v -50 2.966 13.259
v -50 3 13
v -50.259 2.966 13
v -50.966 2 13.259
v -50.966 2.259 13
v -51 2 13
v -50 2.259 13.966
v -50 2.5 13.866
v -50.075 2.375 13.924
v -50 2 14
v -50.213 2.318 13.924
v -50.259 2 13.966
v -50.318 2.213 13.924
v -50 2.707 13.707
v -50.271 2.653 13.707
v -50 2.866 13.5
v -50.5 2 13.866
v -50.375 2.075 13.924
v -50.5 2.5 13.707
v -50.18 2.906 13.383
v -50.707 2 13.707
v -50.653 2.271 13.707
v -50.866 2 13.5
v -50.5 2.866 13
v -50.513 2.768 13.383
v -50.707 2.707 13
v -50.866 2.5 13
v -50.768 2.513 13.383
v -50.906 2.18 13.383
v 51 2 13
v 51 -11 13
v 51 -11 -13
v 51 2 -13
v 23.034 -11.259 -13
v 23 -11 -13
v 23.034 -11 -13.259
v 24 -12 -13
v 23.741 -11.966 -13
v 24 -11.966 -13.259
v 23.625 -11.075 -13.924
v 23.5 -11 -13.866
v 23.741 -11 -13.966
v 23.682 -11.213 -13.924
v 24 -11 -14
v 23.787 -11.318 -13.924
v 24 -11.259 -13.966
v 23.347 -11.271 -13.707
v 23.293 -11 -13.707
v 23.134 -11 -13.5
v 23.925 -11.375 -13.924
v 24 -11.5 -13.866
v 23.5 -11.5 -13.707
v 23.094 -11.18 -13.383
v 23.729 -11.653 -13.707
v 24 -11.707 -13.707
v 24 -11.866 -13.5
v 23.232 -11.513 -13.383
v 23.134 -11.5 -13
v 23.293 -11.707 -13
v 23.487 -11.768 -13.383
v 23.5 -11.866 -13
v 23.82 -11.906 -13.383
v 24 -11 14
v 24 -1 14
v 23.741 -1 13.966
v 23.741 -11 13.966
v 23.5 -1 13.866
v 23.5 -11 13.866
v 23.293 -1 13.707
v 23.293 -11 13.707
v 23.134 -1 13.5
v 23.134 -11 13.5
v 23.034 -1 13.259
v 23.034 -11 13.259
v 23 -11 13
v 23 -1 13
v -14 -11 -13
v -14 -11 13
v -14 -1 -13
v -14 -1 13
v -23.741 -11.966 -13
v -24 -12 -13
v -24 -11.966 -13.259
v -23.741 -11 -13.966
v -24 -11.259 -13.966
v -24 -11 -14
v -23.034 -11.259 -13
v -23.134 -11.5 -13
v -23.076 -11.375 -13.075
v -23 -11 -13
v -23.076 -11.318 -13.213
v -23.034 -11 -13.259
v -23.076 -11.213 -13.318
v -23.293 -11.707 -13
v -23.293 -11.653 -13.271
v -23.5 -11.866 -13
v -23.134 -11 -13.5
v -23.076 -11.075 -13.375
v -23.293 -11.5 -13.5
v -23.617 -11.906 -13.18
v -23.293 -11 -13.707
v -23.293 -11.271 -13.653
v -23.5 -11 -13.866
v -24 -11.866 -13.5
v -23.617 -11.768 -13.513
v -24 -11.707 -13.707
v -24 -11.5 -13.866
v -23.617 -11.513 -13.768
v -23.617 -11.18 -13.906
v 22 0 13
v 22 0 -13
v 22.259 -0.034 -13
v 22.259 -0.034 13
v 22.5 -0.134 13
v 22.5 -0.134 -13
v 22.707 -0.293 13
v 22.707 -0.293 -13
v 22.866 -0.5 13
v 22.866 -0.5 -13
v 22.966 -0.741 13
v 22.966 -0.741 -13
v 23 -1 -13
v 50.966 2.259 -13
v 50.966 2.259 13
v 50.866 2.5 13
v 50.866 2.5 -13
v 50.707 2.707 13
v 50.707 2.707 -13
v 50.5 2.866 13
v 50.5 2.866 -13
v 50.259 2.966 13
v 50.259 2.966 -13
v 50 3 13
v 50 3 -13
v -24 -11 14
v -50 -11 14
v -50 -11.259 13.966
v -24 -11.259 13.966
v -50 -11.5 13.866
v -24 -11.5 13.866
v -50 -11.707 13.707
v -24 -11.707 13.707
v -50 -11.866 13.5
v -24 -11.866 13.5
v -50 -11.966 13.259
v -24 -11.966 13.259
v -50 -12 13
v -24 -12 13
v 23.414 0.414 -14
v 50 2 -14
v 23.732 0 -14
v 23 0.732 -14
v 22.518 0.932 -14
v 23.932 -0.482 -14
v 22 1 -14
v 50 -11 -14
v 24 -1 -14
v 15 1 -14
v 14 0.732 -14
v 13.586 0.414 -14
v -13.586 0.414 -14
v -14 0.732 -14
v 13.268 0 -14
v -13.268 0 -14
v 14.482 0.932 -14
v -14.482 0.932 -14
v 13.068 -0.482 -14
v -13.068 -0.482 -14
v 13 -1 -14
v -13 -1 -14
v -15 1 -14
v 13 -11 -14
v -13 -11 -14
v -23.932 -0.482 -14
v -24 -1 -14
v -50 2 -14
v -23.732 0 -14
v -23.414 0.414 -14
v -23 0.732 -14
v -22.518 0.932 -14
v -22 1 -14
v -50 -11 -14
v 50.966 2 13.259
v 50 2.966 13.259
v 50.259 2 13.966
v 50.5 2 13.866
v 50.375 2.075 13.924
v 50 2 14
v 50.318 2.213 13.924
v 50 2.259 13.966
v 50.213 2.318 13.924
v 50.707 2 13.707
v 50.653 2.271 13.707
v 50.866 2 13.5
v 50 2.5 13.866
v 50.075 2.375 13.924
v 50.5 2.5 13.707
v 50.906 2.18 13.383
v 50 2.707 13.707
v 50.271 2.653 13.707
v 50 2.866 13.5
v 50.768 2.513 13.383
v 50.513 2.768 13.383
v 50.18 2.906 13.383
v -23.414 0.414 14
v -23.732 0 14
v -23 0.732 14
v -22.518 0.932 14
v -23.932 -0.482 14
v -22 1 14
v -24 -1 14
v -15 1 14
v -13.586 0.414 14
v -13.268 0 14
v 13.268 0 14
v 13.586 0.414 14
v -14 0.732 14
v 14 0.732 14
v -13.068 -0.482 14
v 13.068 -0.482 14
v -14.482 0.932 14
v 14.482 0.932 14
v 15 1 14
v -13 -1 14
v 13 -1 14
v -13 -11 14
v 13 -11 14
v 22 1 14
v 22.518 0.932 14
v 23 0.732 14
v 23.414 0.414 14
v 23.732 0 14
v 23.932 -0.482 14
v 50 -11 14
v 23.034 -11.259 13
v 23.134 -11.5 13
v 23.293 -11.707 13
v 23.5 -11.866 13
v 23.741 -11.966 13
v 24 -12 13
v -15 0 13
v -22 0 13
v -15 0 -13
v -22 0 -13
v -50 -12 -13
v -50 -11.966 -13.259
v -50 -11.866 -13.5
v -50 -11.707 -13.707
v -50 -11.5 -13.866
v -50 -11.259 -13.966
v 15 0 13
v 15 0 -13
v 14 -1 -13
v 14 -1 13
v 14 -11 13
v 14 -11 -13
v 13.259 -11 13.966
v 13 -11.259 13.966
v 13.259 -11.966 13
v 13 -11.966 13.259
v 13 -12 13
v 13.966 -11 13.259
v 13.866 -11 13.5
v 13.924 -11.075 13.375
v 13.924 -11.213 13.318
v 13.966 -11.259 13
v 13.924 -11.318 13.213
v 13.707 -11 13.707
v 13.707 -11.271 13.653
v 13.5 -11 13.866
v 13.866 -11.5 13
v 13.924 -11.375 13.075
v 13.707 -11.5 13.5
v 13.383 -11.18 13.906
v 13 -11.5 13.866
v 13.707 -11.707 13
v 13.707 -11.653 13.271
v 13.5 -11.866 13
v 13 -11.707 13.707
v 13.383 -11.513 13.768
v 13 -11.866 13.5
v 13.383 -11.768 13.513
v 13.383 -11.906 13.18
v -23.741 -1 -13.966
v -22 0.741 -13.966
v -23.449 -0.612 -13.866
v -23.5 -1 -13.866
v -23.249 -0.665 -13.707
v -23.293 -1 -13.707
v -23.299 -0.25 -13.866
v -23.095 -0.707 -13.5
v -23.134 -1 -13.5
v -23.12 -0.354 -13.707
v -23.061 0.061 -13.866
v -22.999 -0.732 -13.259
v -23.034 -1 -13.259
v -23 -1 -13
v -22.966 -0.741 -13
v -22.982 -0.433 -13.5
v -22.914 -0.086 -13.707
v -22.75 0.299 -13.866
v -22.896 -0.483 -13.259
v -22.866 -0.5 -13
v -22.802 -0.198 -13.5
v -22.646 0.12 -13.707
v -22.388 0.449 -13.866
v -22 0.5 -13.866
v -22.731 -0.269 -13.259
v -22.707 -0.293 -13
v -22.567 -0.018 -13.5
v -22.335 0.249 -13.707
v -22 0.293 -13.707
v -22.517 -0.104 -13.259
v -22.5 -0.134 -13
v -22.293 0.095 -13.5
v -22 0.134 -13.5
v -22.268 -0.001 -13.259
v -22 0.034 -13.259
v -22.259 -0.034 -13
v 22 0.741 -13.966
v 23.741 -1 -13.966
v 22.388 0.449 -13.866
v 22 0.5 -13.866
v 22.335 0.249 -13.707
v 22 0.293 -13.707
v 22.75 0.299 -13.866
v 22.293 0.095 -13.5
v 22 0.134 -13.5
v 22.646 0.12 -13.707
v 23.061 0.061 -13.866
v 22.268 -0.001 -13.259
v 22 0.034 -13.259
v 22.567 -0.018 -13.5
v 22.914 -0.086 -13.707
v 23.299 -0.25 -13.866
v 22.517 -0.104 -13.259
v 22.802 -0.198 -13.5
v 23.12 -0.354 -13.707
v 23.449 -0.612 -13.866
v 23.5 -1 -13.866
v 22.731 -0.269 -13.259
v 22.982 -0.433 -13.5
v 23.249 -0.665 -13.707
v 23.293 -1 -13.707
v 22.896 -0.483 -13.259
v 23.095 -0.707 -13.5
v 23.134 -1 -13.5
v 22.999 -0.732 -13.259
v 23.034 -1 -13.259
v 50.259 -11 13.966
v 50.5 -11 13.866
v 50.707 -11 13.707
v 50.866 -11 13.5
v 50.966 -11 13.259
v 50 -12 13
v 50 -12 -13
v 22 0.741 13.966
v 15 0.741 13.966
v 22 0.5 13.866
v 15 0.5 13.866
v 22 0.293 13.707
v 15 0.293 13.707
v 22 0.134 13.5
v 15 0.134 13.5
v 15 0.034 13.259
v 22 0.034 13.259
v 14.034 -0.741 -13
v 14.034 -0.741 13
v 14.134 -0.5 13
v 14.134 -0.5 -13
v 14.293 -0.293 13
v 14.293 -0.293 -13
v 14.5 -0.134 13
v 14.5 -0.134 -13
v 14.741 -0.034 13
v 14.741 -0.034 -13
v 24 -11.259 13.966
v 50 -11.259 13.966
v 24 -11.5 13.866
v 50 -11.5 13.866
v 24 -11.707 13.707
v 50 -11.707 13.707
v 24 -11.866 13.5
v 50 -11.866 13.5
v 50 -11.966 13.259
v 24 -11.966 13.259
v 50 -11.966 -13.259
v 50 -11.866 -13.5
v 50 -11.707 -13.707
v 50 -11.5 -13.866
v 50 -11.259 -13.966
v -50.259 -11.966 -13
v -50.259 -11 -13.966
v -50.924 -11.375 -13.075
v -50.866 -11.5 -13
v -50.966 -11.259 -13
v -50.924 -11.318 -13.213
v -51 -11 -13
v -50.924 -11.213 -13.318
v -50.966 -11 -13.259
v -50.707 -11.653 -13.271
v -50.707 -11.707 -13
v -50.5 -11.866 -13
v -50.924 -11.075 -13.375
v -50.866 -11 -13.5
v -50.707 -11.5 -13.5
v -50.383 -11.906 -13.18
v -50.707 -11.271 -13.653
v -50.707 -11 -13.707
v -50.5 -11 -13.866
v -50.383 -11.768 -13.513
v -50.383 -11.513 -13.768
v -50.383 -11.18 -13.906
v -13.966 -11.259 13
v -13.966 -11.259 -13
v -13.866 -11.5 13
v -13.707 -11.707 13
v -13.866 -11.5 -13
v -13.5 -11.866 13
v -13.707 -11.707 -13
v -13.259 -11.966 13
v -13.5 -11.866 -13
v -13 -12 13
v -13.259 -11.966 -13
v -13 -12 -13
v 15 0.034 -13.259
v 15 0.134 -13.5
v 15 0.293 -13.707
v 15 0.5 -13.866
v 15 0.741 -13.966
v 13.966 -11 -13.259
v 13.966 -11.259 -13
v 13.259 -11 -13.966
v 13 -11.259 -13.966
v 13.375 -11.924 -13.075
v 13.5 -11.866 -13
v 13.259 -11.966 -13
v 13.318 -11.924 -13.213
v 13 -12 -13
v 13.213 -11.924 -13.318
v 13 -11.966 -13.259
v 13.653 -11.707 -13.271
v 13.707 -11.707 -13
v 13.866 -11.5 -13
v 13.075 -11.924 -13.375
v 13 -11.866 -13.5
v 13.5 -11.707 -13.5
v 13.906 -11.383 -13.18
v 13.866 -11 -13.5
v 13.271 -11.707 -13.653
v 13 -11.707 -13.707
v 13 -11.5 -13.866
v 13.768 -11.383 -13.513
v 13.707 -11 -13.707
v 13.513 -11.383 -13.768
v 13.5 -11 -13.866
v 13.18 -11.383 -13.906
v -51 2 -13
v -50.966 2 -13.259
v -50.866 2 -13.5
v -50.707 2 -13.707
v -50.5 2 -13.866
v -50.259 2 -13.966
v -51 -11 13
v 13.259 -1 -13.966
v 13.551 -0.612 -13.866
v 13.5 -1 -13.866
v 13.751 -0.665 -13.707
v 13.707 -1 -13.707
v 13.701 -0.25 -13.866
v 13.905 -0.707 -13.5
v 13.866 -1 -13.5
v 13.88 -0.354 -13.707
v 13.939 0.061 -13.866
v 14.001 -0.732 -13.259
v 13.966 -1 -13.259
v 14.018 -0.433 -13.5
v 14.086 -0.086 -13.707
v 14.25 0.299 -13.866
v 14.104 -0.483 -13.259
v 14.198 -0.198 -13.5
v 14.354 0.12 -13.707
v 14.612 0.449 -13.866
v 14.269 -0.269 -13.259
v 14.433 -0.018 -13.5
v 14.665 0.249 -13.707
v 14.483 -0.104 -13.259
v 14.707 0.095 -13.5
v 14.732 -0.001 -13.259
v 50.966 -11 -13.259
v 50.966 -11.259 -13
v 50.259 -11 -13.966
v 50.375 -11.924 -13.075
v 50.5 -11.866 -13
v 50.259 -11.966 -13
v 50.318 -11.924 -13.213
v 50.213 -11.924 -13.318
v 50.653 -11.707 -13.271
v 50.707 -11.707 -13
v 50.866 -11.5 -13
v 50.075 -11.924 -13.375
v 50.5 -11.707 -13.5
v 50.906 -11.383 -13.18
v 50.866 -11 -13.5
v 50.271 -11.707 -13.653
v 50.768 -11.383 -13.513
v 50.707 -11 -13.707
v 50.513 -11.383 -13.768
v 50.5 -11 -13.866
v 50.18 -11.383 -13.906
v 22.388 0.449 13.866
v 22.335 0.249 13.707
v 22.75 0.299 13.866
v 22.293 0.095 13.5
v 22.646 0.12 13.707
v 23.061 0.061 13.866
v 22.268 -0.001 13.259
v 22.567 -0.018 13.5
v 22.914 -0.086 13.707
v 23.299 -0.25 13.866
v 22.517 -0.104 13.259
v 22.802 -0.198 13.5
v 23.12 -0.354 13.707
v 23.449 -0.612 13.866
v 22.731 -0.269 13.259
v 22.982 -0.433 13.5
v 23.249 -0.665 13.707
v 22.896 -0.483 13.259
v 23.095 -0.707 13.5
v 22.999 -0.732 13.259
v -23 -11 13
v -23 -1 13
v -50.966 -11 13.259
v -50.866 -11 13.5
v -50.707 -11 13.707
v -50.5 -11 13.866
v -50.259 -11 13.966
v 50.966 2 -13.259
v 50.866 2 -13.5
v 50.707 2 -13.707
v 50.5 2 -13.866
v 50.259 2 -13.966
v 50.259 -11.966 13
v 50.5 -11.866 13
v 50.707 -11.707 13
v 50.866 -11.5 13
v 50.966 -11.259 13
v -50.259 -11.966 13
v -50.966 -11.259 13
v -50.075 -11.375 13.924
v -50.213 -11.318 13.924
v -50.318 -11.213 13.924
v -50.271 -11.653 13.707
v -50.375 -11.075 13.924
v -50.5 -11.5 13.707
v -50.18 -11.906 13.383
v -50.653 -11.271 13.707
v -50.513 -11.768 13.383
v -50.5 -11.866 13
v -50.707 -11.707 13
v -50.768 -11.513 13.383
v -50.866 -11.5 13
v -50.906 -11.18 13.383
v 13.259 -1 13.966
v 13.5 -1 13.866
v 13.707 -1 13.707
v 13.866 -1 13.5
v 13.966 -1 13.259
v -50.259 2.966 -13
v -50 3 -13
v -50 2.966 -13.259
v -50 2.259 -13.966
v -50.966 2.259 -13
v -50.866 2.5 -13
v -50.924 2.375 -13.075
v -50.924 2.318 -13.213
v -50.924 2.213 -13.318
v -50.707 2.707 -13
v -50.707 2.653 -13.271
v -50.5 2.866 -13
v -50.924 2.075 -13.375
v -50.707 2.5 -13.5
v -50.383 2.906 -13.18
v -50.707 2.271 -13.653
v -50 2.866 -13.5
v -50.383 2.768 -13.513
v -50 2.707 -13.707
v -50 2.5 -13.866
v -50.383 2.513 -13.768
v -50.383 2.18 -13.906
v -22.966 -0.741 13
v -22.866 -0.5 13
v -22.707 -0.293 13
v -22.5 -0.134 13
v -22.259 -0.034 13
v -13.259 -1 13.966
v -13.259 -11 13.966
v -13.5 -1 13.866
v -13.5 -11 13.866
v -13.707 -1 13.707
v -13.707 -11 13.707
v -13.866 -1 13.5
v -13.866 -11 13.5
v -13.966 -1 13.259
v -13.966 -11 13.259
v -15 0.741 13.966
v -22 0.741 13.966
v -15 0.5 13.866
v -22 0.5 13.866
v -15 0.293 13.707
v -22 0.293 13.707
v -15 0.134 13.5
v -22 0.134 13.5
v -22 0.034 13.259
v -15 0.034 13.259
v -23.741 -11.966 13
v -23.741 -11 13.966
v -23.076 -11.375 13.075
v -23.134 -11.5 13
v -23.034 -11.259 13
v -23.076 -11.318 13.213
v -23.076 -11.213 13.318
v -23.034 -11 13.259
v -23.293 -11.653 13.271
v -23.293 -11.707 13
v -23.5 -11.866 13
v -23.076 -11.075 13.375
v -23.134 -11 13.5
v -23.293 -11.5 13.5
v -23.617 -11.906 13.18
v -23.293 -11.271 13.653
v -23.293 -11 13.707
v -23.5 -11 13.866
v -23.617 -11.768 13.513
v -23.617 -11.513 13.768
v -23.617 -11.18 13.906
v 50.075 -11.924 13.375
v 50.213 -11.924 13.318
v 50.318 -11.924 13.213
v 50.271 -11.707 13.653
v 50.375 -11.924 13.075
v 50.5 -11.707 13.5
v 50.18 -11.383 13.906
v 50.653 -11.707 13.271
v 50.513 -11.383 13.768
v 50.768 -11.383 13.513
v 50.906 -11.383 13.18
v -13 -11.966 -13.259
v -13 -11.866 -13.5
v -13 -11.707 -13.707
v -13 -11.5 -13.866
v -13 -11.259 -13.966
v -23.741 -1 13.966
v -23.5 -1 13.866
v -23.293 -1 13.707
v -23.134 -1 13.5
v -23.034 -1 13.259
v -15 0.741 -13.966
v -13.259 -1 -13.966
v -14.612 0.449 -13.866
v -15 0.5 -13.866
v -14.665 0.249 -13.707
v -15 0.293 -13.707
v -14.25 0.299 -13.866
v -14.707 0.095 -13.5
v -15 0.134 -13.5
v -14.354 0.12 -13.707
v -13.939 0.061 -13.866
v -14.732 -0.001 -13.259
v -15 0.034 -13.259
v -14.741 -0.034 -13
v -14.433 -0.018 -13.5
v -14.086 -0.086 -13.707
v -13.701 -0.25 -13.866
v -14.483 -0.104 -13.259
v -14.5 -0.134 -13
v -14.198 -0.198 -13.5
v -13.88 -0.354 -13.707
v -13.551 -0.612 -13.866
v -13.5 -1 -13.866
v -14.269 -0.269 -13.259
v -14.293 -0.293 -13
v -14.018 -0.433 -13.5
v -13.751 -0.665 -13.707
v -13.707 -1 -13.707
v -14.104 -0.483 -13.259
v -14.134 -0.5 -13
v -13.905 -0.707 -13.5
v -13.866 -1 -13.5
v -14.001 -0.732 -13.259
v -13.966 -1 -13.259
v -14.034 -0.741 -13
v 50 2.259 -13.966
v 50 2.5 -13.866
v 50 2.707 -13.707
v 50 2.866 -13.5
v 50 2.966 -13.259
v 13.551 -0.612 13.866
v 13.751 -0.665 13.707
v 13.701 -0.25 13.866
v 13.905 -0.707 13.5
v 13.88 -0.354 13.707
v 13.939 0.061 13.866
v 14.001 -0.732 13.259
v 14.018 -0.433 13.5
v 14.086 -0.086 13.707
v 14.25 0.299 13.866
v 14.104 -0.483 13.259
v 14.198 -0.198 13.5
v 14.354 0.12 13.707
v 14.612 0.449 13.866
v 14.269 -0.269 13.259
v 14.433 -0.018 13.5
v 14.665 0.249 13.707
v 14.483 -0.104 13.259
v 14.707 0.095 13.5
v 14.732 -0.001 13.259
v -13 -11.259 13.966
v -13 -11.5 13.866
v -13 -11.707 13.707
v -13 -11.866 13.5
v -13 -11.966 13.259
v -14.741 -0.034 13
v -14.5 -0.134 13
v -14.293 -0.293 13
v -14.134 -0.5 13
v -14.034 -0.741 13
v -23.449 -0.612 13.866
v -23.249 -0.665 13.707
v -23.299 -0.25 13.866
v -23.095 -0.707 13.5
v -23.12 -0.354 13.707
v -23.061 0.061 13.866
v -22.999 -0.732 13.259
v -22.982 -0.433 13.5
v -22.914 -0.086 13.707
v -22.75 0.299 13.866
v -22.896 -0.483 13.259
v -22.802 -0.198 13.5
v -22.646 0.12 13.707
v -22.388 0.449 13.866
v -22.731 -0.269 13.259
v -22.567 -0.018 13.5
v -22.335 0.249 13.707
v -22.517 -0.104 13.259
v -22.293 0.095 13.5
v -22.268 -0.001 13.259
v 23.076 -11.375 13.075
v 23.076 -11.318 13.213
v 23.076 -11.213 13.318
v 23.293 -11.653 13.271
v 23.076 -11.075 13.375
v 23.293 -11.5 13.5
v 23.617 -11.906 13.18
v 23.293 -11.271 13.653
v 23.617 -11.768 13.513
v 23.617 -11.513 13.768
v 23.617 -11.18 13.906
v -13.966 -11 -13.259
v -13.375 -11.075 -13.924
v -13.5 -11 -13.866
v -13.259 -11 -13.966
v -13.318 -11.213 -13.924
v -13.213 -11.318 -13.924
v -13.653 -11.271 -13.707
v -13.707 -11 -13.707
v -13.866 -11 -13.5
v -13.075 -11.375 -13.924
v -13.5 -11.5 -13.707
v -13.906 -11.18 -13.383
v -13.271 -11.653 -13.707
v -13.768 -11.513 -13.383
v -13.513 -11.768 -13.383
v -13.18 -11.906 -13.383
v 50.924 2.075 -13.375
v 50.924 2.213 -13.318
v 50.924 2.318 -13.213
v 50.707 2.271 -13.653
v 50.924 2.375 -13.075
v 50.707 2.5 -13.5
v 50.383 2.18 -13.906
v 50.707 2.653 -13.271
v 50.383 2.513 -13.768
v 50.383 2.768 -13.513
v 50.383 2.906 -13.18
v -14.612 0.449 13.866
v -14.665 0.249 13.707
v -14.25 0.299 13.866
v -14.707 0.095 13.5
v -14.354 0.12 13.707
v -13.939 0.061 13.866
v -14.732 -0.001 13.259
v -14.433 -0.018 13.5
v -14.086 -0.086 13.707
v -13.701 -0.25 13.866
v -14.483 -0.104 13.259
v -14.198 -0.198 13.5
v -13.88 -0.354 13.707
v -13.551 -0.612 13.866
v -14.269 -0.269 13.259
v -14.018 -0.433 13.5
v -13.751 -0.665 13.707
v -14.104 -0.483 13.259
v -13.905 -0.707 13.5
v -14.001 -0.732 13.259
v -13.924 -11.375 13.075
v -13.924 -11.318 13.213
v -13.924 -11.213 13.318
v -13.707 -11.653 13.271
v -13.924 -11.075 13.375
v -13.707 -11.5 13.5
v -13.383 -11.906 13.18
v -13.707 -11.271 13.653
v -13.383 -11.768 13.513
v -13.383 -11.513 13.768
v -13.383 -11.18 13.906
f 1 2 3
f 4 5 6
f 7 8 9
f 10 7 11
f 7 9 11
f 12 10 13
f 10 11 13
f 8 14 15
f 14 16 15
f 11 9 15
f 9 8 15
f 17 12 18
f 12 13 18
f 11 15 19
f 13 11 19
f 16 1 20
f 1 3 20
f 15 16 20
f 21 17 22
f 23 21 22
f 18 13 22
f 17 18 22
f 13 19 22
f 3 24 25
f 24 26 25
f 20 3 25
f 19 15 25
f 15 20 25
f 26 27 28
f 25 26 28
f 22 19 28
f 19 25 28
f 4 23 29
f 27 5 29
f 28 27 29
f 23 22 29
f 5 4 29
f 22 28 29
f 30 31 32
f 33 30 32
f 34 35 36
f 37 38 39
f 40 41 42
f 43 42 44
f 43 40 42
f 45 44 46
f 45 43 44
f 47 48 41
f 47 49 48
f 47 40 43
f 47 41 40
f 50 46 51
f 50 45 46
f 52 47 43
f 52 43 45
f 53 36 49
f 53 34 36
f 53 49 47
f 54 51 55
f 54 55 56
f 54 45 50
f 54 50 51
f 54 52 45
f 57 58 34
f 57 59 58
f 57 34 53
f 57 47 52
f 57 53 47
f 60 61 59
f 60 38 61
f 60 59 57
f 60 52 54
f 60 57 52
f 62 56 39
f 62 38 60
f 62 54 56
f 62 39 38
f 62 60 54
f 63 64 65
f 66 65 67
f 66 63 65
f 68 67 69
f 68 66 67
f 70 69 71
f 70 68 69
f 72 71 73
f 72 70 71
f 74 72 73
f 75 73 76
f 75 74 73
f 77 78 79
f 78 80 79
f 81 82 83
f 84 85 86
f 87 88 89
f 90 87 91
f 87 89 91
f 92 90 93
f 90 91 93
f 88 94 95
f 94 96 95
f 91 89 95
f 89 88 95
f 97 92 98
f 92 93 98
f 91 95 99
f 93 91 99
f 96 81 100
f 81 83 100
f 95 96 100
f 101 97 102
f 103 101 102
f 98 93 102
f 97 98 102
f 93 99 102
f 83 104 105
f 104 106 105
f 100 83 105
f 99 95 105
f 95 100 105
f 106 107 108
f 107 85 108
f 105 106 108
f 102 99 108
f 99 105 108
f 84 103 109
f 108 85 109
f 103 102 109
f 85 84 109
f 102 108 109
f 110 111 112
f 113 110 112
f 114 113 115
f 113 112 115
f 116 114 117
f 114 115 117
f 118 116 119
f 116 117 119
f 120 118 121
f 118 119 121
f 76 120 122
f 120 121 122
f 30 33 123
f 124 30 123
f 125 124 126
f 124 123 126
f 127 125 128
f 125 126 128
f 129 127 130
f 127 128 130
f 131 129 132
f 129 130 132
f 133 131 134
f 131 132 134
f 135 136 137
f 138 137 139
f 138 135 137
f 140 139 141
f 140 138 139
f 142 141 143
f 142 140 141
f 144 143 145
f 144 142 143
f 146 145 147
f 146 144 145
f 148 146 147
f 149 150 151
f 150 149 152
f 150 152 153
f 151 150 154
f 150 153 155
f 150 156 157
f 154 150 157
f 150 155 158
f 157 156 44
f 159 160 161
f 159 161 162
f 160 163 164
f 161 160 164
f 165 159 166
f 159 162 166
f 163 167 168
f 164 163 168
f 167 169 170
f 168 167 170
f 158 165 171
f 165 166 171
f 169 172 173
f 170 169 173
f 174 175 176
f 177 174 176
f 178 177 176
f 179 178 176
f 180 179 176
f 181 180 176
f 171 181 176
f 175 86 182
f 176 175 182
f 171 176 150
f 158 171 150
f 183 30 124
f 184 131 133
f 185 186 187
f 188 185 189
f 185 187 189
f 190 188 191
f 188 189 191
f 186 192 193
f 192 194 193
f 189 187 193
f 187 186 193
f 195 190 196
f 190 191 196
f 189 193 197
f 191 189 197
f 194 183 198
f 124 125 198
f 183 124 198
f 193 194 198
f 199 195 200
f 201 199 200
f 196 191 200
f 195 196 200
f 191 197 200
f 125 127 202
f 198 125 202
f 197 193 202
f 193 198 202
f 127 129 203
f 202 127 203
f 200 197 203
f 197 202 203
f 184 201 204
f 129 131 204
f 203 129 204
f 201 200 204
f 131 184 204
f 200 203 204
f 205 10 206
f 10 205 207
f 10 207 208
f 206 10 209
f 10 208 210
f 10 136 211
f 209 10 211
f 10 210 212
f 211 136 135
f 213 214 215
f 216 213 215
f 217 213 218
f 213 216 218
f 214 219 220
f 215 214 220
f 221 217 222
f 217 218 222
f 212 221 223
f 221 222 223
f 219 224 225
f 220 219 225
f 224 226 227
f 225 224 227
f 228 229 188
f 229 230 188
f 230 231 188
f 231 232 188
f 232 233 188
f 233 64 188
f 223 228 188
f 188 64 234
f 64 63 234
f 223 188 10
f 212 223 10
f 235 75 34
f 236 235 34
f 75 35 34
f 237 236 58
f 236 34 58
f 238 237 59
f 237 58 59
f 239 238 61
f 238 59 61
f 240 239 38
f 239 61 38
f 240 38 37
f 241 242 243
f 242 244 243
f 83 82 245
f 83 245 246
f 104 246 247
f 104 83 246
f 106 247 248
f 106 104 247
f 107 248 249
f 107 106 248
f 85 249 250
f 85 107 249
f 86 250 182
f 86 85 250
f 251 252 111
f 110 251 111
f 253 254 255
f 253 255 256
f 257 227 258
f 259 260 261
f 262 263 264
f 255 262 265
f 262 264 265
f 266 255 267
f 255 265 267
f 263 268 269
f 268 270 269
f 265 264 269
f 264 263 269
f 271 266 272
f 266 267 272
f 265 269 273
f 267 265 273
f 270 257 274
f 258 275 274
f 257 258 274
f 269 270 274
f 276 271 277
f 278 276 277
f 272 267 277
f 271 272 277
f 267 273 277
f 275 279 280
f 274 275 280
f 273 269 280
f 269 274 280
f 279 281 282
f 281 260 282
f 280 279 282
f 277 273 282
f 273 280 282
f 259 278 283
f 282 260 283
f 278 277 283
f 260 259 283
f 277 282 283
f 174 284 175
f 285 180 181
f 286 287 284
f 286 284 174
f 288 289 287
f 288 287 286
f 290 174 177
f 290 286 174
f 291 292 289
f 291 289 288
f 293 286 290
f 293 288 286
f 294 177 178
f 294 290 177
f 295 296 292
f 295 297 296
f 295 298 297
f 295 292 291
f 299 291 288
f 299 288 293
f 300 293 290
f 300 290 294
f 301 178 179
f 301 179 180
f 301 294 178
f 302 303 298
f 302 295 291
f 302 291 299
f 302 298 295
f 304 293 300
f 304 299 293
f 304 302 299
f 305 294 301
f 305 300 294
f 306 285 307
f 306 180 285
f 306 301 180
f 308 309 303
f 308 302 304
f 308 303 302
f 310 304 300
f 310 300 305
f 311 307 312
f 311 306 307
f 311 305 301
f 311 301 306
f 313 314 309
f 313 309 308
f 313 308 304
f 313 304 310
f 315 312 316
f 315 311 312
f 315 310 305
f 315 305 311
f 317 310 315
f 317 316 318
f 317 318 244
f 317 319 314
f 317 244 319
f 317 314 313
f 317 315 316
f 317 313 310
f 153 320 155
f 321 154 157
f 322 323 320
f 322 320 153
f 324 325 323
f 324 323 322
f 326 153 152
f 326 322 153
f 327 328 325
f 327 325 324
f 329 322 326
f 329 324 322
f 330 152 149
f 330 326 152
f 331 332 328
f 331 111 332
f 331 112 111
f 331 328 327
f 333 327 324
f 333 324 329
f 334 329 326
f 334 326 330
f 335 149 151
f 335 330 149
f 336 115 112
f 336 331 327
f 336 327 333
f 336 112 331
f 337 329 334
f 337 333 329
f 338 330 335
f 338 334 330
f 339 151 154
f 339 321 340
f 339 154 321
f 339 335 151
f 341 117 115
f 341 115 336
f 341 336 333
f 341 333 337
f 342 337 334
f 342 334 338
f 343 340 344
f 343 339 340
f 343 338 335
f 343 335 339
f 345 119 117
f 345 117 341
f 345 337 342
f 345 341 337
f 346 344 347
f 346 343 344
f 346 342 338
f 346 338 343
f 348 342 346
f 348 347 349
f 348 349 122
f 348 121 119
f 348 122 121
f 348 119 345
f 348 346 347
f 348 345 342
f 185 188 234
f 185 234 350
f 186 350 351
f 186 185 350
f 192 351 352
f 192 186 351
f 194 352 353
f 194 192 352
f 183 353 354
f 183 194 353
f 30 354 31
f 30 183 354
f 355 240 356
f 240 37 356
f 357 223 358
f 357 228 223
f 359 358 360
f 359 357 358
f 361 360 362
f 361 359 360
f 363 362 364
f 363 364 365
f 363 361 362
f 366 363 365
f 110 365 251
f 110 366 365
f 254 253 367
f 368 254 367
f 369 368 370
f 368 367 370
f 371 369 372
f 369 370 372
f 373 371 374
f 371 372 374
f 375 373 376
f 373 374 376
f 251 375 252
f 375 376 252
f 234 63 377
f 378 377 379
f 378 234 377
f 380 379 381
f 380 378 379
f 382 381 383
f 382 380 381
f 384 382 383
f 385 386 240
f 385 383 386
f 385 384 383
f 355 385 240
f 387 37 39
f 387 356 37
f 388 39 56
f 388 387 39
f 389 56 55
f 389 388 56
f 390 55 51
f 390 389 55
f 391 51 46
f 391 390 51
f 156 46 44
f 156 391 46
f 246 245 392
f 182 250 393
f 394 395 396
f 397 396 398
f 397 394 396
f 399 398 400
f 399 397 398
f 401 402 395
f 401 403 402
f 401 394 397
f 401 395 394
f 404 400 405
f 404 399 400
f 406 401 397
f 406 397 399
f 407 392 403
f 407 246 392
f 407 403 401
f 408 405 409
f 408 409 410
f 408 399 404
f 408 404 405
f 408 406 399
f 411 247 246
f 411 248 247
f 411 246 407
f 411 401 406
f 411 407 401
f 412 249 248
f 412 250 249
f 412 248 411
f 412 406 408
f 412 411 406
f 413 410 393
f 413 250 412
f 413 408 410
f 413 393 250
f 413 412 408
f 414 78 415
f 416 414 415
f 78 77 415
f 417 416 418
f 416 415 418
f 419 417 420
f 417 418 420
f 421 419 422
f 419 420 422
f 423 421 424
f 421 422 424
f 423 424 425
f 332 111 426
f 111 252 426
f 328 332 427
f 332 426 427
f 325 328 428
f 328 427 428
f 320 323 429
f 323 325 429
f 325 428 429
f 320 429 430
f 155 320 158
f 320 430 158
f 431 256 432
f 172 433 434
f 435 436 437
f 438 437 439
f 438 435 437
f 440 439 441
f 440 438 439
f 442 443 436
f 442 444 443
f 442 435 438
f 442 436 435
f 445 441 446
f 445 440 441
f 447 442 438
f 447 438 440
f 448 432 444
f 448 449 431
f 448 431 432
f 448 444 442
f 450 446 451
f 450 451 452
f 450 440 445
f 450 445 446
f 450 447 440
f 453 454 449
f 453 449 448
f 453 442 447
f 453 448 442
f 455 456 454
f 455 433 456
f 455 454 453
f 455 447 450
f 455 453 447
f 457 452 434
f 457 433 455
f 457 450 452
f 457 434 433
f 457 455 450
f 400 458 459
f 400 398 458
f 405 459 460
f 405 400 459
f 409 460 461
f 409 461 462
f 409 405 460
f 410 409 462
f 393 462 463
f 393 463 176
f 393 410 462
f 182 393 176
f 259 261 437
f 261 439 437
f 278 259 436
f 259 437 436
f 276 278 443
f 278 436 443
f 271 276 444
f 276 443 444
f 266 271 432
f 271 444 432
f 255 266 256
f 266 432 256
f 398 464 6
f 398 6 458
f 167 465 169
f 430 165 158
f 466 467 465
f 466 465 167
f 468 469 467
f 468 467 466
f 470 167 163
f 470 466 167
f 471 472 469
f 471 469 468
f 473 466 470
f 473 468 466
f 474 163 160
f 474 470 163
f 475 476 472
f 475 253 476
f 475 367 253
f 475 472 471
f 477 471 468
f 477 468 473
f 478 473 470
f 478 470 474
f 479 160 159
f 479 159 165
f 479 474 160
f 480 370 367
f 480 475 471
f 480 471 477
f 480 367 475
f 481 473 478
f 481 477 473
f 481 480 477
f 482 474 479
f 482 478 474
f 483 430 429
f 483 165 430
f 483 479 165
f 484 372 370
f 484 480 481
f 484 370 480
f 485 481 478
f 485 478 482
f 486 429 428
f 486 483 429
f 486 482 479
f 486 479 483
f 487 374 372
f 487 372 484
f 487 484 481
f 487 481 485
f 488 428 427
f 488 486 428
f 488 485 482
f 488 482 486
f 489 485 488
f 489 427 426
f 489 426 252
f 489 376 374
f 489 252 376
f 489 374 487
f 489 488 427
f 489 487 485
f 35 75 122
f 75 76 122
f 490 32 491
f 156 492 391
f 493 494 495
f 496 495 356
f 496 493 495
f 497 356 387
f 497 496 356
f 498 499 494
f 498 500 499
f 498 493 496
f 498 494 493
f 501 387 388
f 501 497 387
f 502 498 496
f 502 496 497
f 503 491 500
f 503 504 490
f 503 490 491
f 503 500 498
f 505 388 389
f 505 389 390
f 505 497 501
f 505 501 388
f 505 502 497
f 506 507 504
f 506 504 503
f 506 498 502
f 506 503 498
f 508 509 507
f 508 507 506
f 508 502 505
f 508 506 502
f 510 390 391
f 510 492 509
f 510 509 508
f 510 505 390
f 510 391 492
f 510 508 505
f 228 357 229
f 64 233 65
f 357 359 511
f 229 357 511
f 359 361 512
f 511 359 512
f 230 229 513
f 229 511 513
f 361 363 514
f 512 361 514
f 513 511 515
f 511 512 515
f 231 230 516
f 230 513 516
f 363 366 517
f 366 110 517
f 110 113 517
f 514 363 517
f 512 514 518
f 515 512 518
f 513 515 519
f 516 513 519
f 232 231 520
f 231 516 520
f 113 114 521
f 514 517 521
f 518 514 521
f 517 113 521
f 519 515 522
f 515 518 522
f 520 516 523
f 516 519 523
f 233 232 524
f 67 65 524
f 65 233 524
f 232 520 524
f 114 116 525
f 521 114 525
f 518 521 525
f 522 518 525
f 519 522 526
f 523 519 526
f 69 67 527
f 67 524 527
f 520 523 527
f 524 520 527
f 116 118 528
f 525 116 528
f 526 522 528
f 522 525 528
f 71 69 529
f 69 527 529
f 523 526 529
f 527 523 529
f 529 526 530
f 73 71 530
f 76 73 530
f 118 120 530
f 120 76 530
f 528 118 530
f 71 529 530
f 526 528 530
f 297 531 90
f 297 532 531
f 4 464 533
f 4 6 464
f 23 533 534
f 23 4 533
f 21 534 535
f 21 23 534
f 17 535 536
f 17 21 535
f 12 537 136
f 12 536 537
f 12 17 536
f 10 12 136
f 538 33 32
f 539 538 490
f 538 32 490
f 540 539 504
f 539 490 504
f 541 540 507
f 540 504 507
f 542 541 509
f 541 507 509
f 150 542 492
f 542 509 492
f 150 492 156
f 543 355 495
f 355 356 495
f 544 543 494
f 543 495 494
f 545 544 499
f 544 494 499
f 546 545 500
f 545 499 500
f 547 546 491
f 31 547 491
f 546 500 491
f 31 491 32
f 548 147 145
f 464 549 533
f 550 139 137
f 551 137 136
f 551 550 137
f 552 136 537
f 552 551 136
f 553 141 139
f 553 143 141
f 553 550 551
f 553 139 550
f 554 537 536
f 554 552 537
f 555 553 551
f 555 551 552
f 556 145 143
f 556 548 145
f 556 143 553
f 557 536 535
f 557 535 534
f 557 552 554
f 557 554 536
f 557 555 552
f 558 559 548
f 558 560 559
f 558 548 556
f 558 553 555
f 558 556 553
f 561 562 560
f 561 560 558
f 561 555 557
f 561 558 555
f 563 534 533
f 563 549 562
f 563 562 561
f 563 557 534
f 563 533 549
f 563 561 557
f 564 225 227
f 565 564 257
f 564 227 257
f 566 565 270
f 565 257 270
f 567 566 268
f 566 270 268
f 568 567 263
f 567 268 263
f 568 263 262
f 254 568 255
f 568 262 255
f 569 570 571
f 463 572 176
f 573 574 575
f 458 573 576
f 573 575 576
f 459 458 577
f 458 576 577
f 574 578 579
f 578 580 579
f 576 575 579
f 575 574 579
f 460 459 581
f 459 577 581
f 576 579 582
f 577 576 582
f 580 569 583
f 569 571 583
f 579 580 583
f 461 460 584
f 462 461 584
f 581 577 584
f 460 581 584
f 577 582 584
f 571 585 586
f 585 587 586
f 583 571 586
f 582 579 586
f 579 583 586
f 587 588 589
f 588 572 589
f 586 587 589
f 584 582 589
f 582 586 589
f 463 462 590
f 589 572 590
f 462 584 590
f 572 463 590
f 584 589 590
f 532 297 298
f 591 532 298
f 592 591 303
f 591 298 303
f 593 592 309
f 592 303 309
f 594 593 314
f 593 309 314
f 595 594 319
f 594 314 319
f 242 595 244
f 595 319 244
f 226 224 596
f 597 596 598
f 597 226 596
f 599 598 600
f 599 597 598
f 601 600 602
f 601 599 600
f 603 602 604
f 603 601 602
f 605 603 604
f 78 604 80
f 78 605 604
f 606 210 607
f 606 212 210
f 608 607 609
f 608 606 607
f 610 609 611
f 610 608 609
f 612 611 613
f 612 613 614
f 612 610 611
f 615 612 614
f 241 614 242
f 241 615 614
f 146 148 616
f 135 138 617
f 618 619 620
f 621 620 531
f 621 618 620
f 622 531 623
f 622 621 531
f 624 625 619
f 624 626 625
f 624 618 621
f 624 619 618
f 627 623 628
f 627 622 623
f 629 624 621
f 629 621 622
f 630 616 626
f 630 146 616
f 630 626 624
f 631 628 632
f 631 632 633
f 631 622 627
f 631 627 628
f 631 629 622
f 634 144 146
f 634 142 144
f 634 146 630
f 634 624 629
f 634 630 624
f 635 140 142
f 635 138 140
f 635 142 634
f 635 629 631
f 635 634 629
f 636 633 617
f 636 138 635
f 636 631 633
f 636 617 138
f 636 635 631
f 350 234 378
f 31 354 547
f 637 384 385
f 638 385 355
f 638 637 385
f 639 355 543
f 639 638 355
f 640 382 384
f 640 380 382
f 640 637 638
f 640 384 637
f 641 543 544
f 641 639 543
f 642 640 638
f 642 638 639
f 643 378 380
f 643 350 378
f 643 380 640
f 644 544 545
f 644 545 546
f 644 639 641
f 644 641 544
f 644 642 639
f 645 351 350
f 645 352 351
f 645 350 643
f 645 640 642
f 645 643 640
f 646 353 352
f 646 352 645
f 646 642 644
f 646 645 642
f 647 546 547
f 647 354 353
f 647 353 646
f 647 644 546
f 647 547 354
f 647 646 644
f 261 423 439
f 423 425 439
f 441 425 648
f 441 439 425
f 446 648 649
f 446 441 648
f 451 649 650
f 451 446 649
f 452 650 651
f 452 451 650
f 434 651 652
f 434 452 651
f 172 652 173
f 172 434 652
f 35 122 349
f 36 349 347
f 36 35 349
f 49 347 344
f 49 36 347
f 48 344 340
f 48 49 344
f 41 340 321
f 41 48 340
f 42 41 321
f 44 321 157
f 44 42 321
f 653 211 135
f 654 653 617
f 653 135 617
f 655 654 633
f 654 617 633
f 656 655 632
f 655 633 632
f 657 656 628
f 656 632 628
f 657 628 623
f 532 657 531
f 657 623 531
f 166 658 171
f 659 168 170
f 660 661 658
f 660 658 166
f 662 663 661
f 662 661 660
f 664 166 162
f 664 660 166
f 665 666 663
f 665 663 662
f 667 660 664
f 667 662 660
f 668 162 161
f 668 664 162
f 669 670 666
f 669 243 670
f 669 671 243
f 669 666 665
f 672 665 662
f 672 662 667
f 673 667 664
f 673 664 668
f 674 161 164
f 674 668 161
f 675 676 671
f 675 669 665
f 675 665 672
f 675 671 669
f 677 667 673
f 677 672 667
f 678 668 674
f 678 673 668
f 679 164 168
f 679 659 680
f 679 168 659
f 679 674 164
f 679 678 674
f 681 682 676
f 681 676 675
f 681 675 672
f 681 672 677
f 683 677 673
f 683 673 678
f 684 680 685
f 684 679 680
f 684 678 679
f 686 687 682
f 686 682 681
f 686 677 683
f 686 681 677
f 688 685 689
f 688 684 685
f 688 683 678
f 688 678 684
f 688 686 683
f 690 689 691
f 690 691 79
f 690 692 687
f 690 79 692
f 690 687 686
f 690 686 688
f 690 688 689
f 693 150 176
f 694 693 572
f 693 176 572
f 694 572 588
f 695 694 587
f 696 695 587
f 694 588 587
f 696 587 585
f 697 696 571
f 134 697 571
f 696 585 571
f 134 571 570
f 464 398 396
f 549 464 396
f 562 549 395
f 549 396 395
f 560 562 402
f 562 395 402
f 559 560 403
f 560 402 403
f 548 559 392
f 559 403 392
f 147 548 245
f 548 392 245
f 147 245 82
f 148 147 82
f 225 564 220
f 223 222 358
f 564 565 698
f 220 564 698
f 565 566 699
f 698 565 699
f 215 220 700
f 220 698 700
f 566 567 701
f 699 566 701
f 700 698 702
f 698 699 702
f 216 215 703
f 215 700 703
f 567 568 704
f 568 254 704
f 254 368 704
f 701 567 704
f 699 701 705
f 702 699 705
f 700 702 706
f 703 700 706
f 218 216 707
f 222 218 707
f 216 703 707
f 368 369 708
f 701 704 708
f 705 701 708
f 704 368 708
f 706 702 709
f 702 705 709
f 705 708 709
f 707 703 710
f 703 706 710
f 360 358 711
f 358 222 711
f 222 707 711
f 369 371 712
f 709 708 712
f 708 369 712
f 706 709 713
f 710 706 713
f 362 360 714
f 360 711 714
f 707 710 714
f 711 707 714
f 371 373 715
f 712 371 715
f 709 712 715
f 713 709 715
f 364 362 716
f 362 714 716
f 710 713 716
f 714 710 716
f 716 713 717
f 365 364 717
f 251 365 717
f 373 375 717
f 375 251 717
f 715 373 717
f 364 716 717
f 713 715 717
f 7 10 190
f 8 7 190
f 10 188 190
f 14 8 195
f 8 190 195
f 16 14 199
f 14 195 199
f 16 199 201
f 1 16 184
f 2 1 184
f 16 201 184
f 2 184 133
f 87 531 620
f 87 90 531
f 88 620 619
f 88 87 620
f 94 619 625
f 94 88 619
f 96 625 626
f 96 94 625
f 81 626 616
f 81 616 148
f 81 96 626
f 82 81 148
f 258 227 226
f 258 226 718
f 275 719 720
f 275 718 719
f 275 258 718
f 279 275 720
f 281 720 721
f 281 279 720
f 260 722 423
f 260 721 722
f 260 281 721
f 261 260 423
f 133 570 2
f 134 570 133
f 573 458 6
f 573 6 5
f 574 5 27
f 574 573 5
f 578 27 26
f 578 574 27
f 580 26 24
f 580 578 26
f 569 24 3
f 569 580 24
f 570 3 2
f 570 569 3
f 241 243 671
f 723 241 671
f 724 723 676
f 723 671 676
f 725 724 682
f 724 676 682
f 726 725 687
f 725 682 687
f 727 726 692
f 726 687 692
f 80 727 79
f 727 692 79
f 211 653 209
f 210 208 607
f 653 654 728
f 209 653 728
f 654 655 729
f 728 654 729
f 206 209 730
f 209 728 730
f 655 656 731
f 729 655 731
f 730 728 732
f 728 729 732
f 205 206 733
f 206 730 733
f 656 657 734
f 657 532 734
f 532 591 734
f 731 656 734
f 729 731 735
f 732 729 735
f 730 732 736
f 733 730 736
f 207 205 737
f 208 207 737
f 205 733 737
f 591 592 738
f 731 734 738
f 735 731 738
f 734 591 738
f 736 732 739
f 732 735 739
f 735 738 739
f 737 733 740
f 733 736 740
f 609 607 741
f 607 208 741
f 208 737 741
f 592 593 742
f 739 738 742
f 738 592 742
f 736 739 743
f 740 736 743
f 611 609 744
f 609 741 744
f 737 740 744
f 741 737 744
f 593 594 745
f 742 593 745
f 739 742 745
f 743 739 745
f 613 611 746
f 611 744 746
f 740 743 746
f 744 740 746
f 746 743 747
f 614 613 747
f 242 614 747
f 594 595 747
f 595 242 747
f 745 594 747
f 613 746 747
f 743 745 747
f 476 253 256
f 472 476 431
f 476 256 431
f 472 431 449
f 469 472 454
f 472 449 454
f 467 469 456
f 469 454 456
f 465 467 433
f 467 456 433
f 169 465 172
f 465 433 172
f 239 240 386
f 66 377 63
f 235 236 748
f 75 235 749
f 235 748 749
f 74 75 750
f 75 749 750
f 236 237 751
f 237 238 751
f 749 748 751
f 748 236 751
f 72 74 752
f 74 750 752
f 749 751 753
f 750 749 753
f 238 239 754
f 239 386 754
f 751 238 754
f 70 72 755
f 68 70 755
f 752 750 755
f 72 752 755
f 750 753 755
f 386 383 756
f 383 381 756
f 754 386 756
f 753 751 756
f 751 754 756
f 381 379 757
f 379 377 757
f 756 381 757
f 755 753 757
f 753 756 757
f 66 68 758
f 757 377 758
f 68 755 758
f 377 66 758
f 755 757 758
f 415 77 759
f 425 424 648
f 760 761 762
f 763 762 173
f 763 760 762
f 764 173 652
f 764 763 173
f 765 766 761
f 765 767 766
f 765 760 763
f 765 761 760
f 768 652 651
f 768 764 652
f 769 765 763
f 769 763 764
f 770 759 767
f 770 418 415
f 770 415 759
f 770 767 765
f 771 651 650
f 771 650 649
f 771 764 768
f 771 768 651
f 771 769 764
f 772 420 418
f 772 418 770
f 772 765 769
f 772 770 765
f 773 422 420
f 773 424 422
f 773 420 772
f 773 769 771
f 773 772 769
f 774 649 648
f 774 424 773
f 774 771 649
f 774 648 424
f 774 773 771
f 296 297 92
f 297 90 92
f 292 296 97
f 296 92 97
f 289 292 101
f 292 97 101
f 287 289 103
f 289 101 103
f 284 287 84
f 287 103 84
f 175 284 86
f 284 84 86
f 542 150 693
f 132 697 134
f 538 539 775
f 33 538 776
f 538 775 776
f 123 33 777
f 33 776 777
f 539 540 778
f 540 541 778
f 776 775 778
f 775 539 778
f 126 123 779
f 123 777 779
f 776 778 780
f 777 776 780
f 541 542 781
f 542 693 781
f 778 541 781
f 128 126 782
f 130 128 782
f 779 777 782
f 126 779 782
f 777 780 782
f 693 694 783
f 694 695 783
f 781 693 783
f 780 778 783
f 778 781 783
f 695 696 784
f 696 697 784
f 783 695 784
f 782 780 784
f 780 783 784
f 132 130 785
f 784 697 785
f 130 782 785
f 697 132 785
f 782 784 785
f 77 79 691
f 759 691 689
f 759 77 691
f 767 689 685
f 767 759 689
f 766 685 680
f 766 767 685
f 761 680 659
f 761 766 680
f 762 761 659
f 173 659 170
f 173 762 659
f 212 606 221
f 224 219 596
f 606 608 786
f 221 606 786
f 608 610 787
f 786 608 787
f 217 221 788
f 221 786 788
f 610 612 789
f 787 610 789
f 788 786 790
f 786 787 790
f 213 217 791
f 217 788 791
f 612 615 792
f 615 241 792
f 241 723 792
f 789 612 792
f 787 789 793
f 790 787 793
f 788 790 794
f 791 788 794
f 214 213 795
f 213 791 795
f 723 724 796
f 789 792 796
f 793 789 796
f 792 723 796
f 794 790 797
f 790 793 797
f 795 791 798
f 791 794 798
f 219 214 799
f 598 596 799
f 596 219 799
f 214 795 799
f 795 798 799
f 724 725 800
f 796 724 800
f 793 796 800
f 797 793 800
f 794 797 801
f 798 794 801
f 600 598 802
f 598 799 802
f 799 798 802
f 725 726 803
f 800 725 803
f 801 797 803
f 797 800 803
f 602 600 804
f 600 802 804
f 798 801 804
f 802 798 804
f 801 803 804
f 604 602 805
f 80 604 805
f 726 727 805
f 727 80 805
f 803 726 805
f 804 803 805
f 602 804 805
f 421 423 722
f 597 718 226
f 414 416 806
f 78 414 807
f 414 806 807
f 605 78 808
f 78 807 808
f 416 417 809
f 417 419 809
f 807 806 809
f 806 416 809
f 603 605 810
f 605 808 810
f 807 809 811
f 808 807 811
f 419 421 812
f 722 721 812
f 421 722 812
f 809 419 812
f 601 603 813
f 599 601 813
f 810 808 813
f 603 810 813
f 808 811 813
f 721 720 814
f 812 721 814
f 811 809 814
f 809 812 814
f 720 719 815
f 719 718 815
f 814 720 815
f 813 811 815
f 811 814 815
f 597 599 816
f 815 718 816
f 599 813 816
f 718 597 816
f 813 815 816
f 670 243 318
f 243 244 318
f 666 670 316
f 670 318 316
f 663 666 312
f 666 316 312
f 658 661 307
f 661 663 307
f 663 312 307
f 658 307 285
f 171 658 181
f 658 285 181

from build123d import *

# Parameters (mm, degrees)
SKETCH_2_W        = 28
SKETCH_2_H        = 28
EXTRUDE_3_DEPTH   = 12
EXTRUDE_3_2_DEPTH = 12
EXTRUDE_3_3_DEPTH = 12
SKETCH_2_3_W      = 9
SKETCH_2_3_H      = 28
SKETCH_2_3_W_2    = 28
EXTRUDE_4_DEPTH   = 3
FILLET_1_R        = 1


with BuildPart() as part:
    # 草图2 → 凸台-拉伸3 (new body)
    with BuildSketch(Plane(origin=(0, 0, 0), x_dir=(1, 0, 0), z_dir=(0, 1, 0))):
        with Locations((-37, 0)):
            Rectangle(SKETCH_2_W, SKETCH_2_H)
    extrude(amount=-EXTRUDE_3_DEPTH)



with BuildPart() as body_2:
    # 草图2 → Extrude 3 2 (new body)
    with BuildSketch(Plane(origin=(0, 0, 0), x_dir=(1, 0, 0), z_dir=(0, 1, 0))):
        Rectangle(SKETCH_2_W, SKETCH_2_H)
    extrude(amount=-EXTRUDE_3_2_DEPTH)


with BuildPart() as body_3:
    # 草图2 → Extrude 3 3 (new body)
    with BuildSketch(Plane(origin=(0, 0, 0), x_dir=(1, 0, 0), z_dir=(0, 1, 0))):
        with Locations((37, 0)):
            Rectangle(SKETCH_2_W, SKETCH_2_H)
    extrude(amount=-EXTRUDE_3_3_DEPTH)


with BuildPart() as part_1:
    add(part.part)

    add(body_2.part)  # 凸台-拉伸4 merges body 2

    add(body_3.part)  # 凸台-拉伸4 merges body 3
    # 草图2<3> → 凸台-拉伸4 (add)
    with BuildSketch(Plane(origin=(0, 0, 0), x_dir=(1, 0, 0), z_dir=(0, 1, 0))):
        with Locations((-18.5, 0)):
            Rectangle(SKETCH_2_3_W, SKETCH_2_3_H)
        with Locations((-37, 0)):
            Rectangle(SKETCH_2_3_W_2, SKETCH_2_3_H)
        Rectangle(SKETCH_2_3_W_2, SKETCH_2_3_H)
        with Locations((18.5, 0)):
            Rectangle(SKETCH_2_3_W, SKETCH_2_3_H)
        with Locations((37, 0)):
            Rectangle(SKETCH_2_3_W_2, SKETCH_2_3_H)
    extrude(amount=EXTRUDE_4_DEPTH)

    # 圆角1
    fillet_1_edges = [part_1.edges().sort_by_distance(p)[0] for p in [
        (-37, -12, -14),
        (-51, -12, 0),
        (0, 3, -14),
        (51, -4.5, -14),
        (-18.5, 0, 14),
        (51, 3, 0),
        (51, -4.5, 14),
        (-51, 3, 0),
        (0, 3, 14),
        (-18.5, 0, -14),
        (-37, -12, 14),
        (18.5, 0, -14),
        (18.5, 0, 14),
        (14, 0, 0),
        (14, -6, -14),
        (0, -12, 14),
        (14, -6, 14),
        (-14, -12, 0),
        (-14, -6, 14),
        (-14, -6, -14),
        (14, -12, 0),
        (0, -12, -14),
        (-14, 0, 0),
        (37, -12, 14),
        (23, -12, 0),
        (23, -6, 14),
        (23, -6, -14),
        (51, -12, 0),
        (37, -12, -14),
        (23, 0, 0),
        (-23, -12, 0),
        (-23, 0, 0),
        (-23, -6, 14),
        (-51, -4.5, 14),
        (-51, -4.5, -14),
        (-23, -6, -14),
    ]]
    fillet(fillet_1_edges, radius=FILLET_1_R)


solid = part_1.part
